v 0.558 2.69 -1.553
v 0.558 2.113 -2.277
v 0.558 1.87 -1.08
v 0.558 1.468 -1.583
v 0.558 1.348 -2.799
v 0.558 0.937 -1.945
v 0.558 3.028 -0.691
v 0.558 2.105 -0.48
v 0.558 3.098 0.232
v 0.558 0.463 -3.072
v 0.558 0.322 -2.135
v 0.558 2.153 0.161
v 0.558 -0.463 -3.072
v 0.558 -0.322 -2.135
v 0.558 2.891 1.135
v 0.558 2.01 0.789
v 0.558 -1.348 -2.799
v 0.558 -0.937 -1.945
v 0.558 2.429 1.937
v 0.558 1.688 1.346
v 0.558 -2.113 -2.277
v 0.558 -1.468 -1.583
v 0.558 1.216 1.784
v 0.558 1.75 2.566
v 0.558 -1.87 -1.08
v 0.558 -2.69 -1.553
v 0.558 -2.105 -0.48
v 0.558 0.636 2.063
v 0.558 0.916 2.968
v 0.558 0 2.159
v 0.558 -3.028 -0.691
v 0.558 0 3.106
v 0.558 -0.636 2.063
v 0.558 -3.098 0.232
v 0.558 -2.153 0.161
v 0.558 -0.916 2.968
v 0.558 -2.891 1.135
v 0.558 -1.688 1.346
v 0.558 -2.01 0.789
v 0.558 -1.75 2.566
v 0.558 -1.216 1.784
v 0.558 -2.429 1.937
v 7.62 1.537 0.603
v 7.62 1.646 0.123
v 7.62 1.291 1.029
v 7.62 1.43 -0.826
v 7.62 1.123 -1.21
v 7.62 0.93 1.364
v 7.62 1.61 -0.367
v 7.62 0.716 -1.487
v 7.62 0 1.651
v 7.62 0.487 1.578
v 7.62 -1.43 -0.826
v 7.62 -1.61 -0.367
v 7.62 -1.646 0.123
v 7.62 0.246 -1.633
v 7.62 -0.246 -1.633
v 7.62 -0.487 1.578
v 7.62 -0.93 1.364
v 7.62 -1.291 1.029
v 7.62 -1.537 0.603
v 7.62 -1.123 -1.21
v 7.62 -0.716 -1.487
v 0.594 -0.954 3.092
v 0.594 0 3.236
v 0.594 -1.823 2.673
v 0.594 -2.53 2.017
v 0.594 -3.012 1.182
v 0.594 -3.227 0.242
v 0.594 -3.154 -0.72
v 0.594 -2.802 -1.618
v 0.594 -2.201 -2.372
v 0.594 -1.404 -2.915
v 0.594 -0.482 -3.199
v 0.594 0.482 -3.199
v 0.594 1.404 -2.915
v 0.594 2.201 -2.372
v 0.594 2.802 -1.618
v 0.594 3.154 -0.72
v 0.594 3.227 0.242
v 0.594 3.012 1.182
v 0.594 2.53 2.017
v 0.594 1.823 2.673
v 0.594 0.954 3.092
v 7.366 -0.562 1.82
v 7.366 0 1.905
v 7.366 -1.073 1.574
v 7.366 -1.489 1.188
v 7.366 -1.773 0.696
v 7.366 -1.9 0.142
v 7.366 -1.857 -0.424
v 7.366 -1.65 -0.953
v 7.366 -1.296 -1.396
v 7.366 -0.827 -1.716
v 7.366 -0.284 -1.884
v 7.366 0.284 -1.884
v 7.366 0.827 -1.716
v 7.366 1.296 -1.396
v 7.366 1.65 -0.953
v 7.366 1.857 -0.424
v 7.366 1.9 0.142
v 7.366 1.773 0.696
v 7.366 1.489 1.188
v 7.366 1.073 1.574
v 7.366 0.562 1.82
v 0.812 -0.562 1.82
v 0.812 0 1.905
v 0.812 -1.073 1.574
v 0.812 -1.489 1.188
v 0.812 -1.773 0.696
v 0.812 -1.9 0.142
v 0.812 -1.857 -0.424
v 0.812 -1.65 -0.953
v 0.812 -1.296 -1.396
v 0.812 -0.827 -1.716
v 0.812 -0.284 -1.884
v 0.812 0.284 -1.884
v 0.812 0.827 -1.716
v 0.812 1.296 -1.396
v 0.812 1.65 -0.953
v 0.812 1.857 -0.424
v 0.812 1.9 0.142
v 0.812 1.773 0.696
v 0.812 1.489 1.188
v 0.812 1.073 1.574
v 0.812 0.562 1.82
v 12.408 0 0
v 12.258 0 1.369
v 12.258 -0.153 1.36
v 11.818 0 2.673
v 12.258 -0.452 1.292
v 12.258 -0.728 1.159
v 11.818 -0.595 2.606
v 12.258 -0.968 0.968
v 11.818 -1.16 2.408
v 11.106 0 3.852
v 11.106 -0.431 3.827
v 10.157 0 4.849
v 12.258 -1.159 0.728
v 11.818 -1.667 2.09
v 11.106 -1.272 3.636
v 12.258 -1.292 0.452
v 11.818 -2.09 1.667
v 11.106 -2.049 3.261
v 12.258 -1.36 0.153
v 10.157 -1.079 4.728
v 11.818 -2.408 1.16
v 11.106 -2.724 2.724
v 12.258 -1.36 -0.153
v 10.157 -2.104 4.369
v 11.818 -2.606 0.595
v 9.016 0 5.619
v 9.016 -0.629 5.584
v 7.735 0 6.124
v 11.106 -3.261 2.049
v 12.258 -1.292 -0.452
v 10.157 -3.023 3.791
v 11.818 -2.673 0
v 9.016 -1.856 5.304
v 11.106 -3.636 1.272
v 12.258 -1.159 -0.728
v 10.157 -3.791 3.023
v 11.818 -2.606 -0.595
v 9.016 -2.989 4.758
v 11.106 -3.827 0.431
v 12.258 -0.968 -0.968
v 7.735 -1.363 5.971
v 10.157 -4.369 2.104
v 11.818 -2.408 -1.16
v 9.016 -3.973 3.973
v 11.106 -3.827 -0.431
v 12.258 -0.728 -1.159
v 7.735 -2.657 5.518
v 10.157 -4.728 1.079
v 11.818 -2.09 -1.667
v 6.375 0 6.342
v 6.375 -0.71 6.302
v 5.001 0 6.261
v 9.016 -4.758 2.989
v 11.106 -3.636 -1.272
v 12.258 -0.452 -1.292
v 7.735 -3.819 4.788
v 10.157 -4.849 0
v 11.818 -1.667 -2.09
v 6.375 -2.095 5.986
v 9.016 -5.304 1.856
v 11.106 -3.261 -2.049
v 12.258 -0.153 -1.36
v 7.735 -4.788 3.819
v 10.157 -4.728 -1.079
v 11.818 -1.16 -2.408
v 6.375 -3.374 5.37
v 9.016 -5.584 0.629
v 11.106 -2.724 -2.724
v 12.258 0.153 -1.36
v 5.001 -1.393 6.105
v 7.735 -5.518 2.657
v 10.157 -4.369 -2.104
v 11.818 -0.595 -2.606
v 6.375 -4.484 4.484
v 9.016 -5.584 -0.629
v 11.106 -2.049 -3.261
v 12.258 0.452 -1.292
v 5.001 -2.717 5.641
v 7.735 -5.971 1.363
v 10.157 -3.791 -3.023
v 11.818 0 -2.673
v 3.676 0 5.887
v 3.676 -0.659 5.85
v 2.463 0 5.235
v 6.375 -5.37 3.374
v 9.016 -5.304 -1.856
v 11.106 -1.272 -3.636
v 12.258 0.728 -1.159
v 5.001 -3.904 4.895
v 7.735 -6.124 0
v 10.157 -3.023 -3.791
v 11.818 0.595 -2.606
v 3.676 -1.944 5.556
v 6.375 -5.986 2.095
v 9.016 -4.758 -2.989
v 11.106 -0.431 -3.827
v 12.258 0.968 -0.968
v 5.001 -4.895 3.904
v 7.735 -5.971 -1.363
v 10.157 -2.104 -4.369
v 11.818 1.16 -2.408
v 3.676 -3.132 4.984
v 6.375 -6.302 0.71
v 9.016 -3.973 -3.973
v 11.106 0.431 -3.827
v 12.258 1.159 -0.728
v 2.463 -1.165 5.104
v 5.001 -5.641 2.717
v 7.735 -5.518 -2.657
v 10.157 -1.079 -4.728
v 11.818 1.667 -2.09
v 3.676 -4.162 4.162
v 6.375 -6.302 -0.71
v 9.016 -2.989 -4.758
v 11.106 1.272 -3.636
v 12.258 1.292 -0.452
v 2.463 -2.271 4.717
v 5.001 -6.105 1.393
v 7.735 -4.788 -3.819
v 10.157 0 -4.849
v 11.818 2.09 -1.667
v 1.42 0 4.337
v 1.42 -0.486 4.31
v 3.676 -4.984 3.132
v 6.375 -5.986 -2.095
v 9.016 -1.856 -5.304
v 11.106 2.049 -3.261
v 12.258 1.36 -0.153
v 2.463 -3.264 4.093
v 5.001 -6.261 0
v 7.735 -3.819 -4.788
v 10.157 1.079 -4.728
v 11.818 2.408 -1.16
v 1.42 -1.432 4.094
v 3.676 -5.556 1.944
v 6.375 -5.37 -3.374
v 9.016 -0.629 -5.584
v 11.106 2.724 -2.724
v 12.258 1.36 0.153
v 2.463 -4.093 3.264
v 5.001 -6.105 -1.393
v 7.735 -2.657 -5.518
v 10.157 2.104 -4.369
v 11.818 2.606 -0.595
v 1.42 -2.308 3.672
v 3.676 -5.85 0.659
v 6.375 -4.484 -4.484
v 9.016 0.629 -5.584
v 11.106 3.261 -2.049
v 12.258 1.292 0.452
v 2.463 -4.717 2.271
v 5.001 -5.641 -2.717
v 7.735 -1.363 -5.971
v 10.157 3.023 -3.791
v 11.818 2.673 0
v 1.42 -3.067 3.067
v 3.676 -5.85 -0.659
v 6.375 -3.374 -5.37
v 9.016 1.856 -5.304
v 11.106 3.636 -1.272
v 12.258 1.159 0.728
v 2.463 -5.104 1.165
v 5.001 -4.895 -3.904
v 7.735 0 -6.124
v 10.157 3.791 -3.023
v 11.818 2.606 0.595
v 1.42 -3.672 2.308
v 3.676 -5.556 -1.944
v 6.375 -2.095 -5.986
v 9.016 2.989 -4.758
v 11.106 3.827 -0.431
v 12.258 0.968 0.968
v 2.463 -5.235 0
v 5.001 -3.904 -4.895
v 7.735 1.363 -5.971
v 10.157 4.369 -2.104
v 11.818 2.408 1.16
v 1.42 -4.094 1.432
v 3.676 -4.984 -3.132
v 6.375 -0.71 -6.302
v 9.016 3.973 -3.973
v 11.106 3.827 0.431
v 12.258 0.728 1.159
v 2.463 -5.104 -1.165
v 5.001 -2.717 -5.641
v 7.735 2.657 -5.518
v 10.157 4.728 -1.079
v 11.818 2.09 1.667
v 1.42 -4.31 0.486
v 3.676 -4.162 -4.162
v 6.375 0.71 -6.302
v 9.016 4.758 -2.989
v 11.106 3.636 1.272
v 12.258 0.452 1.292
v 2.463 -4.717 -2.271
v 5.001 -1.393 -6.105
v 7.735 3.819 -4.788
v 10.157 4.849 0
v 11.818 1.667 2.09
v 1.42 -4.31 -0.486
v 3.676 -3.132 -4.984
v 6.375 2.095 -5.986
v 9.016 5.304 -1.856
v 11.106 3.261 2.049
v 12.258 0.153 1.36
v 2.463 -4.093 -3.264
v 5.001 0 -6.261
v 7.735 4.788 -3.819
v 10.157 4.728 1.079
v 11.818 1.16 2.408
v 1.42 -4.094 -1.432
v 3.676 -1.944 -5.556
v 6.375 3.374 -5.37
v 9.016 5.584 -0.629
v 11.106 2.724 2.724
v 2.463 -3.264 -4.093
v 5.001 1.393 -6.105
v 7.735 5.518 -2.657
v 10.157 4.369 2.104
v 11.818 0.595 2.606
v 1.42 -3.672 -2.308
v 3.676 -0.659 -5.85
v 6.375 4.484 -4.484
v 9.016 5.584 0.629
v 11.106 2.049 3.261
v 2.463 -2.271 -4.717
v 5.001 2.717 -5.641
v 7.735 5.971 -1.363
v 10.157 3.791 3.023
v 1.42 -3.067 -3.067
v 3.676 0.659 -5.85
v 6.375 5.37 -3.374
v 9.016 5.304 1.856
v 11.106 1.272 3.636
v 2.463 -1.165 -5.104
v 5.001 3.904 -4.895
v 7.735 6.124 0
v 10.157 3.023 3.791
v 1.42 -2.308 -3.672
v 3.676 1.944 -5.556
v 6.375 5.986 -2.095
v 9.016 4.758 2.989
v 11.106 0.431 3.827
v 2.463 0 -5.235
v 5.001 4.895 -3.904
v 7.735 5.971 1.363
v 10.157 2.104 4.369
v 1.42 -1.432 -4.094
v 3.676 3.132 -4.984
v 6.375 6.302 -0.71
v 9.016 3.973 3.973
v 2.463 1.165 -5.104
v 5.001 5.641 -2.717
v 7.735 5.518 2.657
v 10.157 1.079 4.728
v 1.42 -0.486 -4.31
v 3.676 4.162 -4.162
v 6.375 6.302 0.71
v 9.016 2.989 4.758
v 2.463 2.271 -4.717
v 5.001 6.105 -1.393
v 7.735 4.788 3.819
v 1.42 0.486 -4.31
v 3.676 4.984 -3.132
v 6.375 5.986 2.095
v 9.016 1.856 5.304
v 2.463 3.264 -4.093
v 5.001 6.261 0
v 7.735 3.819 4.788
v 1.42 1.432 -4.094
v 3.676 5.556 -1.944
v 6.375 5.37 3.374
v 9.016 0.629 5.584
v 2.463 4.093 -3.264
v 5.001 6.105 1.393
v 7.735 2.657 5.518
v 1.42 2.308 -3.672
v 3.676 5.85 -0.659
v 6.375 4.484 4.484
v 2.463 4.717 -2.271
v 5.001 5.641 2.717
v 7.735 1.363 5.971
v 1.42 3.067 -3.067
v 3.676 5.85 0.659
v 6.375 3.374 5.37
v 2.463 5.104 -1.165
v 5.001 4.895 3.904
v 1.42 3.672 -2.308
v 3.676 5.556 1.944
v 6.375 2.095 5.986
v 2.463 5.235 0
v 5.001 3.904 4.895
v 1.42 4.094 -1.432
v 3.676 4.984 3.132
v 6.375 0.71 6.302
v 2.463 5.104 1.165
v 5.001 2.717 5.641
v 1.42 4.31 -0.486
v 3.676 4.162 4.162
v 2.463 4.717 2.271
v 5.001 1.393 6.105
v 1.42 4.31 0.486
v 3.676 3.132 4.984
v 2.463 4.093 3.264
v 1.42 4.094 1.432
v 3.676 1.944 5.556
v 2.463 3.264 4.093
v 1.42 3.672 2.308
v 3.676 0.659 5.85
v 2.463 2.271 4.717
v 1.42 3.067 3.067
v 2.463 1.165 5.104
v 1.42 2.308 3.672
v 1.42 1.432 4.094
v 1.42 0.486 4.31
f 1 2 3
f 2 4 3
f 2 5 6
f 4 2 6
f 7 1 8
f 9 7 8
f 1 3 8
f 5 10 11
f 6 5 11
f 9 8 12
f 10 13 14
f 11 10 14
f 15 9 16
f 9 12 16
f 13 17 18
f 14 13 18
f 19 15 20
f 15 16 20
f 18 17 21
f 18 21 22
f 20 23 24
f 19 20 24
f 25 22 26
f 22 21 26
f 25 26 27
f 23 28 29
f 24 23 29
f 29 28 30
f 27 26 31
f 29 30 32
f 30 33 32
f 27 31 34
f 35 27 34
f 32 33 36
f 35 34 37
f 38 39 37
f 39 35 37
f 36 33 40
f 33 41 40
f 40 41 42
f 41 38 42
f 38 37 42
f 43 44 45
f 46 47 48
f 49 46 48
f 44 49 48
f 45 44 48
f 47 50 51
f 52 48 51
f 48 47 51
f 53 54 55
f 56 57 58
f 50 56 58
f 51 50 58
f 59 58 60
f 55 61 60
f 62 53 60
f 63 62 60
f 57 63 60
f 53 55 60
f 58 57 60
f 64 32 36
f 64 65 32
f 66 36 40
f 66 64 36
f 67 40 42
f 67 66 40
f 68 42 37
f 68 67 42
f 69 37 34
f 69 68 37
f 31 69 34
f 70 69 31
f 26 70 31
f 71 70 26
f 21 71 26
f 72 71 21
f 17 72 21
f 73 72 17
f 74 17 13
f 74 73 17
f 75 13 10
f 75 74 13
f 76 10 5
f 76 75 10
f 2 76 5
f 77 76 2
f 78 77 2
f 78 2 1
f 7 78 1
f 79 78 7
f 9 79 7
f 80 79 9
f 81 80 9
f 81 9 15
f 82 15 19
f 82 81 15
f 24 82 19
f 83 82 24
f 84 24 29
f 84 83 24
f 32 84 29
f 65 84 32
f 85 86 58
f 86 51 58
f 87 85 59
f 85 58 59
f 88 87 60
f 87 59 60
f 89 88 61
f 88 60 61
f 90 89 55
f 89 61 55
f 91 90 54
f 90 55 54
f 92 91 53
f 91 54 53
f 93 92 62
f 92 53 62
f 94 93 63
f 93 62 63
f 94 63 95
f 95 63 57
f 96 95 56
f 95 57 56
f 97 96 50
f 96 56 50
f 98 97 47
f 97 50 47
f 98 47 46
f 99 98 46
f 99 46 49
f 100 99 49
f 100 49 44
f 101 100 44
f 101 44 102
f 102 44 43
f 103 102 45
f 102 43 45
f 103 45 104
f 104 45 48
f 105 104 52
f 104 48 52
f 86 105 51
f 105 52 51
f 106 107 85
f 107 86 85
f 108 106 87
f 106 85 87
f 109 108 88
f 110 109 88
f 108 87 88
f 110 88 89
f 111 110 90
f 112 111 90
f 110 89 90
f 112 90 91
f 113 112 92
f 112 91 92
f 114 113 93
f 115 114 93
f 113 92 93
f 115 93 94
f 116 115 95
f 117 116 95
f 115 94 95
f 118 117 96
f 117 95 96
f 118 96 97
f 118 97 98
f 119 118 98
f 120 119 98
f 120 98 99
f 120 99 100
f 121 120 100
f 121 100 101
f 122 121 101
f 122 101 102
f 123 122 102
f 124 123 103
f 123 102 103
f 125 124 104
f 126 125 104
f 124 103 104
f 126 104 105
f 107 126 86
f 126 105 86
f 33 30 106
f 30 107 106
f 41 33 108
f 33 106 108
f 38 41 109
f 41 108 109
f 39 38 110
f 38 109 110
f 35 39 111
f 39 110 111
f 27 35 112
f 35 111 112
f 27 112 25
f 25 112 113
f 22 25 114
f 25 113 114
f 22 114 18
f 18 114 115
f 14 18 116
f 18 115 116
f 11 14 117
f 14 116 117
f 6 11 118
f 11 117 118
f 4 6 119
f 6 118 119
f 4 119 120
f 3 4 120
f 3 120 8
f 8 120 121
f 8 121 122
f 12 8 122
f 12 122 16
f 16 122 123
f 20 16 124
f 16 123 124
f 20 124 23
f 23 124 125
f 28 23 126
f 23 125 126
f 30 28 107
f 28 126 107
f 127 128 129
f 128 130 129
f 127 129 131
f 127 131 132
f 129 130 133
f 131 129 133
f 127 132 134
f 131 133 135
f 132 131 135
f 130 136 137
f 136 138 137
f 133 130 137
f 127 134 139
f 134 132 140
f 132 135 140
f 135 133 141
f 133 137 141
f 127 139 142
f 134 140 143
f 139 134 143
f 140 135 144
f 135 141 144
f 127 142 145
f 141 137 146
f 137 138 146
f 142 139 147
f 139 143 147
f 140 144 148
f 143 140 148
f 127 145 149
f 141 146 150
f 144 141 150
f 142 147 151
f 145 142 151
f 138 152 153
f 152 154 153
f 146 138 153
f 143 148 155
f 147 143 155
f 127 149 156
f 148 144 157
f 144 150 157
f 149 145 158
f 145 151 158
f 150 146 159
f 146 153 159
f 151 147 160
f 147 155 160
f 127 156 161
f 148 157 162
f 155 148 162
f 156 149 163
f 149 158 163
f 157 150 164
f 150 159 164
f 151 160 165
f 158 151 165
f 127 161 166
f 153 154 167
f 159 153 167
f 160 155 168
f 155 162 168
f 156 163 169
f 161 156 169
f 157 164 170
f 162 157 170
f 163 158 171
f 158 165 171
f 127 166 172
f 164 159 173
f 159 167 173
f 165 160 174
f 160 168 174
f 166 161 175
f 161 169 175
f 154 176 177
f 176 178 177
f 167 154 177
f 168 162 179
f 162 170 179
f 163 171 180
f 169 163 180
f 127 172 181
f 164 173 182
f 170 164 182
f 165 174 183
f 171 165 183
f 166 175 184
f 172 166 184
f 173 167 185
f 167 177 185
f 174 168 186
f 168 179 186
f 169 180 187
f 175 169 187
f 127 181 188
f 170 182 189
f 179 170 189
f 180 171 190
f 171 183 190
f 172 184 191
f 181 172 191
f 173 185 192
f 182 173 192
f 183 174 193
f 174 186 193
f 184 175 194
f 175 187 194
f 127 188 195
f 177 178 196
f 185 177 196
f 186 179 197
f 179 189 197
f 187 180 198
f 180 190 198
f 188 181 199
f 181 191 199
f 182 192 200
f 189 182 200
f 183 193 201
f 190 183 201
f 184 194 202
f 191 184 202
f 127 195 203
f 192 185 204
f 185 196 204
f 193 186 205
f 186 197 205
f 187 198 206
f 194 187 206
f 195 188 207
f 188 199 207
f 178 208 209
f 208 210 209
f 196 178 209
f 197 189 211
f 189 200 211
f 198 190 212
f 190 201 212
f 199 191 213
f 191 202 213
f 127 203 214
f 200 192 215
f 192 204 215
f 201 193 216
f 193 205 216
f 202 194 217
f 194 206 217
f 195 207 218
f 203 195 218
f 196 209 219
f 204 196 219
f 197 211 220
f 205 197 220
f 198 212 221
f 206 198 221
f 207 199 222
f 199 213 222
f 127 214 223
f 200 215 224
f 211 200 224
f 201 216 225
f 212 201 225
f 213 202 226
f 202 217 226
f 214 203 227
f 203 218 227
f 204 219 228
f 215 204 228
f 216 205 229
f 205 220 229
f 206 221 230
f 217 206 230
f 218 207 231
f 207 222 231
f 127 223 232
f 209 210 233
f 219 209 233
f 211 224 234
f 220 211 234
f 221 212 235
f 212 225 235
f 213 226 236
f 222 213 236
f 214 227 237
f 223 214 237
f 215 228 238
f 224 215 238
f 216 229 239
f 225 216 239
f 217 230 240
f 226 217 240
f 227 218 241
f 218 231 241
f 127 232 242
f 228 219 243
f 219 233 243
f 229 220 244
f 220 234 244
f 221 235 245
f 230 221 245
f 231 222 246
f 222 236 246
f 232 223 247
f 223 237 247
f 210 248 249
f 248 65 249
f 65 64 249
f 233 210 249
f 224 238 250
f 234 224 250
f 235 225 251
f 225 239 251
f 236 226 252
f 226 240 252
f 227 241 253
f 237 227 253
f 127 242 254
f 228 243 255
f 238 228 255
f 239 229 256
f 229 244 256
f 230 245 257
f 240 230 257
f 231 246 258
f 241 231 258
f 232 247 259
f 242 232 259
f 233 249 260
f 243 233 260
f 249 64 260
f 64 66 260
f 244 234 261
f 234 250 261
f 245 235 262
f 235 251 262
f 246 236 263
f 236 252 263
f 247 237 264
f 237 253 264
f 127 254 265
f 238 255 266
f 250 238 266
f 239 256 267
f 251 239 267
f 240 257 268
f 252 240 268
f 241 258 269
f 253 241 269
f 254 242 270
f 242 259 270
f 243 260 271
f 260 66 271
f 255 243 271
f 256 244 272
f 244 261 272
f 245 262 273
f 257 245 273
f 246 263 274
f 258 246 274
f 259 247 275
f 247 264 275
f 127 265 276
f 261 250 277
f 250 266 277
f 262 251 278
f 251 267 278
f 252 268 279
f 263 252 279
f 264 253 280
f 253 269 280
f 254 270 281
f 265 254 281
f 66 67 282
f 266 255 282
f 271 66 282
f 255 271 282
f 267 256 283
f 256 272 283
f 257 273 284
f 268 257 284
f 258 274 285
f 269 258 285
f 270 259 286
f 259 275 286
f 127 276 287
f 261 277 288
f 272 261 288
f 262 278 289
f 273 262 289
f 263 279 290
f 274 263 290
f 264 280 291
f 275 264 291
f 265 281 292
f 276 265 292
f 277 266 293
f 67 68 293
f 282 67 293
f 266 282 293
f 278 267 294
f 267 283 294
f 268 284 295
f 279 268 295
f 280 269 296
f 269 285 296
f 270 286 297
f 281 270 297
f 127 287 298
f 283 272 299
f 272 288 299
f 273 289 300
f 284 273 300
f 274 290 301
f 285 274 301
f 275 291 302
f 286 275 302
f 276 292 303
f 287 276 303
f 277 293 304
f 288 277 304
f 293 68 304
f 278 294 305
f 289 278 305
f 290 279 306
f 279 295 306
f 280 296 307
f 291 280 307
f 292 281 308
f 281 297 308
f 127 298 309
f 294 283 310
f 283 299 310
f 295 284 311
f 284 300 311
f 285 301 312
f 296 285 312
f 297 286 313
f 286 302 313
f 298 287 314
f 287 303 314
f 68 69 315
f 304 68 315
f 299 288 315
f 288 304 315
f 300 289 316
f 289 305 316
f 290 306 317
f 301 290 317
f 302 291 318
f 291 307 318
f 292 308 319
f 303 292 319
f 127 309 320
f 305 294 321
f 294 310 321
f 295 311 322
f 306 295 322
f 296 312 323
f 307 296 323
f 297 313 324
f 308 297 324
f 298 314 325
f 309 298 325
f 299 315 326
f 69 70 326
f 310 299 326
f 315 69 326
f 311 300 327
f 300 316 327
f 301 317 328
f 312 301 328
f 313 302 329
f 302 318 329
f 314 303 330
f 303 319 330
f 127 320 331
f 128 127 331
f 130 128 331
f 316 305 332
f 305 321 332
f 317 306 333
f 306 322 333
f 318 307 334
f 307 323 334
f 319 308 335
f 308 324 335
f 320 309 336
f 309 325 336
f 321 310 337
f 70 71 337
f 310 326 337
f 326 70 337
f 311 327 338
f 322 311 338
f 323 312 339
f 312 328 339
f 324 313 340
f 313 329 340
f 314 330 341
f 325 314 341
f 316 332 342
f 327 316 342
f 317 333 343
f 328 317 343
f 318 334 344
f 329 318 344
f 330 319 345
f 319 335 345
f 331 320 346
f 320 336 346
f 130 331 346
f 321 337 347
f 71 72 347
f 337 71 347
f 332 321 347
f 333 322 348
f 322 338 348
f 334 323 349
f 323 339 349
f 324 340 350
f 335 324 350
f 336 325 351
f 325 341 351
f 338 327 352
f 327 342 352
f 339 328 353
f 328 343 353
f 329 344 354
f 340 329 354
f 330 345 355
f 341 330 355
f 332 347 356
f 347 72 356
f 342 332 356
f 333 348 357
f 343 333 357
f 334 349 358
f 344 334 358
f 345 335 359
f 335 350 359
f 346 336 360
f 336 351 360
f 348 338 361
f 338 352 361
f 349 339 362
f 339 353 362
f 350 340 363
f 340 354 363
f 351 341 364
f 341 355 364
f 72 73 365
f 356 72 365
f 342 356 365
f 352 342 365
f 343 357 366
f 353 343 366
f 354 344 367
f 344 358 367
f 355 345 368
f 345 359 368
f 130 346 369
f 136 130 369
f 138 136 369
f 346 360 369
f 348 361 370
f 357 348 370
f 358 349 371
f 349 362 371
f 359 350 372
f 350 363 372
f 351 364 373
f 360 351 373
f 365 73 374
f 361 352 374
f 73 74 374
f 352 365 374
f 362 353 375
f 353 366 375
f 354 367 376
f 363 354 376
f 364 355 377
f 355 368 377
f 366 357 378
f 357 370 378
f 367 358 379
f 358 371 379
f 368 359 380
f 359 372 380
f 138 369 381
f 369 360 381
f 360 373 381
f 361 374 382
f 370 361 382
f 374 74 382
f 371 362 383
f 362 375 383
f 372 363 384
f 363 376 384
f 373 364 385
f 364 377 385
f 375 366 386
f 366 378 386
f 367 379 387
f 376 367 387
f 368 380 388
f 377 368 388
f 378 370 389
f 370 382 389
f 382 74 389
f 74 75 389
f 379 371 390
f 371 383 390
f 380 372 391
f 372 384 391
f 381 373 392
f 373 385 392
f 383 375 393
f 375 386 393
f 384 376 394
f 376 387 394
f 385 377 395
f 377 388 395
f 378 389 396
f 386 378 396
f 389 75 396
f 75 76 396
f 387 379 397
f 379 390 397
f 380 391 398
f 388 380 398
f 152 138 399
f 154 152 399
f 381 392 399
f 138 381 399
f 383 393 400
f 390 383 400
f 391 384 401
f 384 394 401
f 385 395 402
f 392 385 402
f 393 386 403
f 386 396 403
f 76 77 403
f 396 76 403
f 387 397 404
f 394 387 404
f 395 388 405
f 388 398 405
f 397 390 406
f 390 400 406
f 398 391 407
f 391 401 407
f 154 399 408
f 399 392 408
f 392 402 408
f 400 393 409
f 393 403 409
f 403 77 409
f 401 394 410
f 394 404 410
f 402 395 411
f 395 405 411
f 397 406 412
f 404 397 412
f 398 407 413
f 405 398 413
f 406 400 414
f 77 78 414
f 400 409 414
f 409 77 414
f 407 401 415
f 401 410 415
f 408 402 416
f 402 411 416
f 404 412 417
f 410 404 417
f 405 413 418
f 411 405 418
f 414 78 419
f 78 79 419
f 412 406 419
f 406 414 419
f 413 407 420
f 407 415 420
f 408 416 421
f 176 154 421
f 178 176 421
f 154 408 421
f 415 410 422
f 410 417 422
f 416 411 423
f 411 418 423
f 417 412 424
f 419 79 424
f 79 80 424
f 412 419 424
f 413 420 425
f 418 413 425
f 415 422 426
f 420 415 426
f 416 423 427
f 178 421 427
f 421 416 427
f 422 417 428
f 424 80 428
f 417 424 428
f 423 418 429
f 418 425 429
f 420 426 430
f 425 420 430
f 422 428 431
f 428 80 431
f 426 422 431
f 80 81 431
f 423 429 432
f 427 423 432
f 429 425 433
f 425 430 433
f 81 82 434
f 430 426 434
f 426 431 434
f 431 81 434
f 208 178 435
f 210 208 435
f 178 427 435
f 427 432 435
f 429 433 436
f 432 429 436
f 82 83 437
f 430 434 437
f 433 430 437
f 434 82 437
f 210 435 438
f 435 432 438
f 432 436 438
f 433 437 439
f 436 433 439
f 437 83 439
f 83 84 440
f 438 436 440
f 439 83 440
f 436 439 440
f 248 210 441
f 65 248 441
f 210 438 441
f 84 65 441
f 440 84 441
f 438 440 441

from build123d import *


# Not quite as in the source:
# - a fillet or chamfer that OpenCascade refuses, or shapes differently, is made with other operations: its cross-section is extruded or revolved along the edge and cut away or added


with BuildPart() as f1:
    # F0 (on Front) → F1 (revolve)
    with BuildSketch(Plane.XZ):
        with BuildLine():
            Line((7.62, 0), (12.407513929, 0))
            ThreePointArc((12.407513929, 0), (7.7010148654, 6.1336289969), (0.558252615, 3.175))
            Line((0.558252615, 3.175), (0.558252615, 1.905))
            Line((0.558252615, 1.905), (7.62, 1.905))
            Line((7.62, 1.905), (7.62, 0))
        make_face()
    revolve(axis=Axis((8.8458018737, 0, 0), (1, 0, 0)))

    # F2: chamfer of 0.254 on 3 edges, made by hand

    # F2_s1 → F2_t2 (revolve)
    with BuildSketch(Plane.XZ):
        Polygon((7.366, 1.905), (7.62, 1.651), (7.62, 1.905), align=None)
    revolve(axis=Axis((7.62, 0, 0), (1, 0, 0)))

    # F2_s3 → F2_t4 (revolve, cut)
    with BuildSketch(Plane.XZ):
        with BuildLine():
            Line((0.558252615, 3.1061953814), (0.5937000602, 3.235620189))
            ThreePointArc((0.5937000602, 3.235620189), (0.5783706102, 3.2095931974), (0.558252615, 3.175))
            Line((0.558252615, 3.175), (0.558252615, 3.1061953814))
        make_face()
    revolve(axis=Axis((0.558252615, 0, 0), (1, 0, 0)), mode=Mode.SUBTRACT)

    # F2_s5 → F2_t6 (revolve, cut)
    with BuildSketch(Plane.XZ):
        Polygon((0.558252615, 2.159), (0.812252615, 1.905), (0.558252615, 1.905), align=None)
    revolve(axis=Axis((0.558252615, 0, 0), (1, 0, 0)), mode=Mode.SUBTRACT)


solid = f1.part
